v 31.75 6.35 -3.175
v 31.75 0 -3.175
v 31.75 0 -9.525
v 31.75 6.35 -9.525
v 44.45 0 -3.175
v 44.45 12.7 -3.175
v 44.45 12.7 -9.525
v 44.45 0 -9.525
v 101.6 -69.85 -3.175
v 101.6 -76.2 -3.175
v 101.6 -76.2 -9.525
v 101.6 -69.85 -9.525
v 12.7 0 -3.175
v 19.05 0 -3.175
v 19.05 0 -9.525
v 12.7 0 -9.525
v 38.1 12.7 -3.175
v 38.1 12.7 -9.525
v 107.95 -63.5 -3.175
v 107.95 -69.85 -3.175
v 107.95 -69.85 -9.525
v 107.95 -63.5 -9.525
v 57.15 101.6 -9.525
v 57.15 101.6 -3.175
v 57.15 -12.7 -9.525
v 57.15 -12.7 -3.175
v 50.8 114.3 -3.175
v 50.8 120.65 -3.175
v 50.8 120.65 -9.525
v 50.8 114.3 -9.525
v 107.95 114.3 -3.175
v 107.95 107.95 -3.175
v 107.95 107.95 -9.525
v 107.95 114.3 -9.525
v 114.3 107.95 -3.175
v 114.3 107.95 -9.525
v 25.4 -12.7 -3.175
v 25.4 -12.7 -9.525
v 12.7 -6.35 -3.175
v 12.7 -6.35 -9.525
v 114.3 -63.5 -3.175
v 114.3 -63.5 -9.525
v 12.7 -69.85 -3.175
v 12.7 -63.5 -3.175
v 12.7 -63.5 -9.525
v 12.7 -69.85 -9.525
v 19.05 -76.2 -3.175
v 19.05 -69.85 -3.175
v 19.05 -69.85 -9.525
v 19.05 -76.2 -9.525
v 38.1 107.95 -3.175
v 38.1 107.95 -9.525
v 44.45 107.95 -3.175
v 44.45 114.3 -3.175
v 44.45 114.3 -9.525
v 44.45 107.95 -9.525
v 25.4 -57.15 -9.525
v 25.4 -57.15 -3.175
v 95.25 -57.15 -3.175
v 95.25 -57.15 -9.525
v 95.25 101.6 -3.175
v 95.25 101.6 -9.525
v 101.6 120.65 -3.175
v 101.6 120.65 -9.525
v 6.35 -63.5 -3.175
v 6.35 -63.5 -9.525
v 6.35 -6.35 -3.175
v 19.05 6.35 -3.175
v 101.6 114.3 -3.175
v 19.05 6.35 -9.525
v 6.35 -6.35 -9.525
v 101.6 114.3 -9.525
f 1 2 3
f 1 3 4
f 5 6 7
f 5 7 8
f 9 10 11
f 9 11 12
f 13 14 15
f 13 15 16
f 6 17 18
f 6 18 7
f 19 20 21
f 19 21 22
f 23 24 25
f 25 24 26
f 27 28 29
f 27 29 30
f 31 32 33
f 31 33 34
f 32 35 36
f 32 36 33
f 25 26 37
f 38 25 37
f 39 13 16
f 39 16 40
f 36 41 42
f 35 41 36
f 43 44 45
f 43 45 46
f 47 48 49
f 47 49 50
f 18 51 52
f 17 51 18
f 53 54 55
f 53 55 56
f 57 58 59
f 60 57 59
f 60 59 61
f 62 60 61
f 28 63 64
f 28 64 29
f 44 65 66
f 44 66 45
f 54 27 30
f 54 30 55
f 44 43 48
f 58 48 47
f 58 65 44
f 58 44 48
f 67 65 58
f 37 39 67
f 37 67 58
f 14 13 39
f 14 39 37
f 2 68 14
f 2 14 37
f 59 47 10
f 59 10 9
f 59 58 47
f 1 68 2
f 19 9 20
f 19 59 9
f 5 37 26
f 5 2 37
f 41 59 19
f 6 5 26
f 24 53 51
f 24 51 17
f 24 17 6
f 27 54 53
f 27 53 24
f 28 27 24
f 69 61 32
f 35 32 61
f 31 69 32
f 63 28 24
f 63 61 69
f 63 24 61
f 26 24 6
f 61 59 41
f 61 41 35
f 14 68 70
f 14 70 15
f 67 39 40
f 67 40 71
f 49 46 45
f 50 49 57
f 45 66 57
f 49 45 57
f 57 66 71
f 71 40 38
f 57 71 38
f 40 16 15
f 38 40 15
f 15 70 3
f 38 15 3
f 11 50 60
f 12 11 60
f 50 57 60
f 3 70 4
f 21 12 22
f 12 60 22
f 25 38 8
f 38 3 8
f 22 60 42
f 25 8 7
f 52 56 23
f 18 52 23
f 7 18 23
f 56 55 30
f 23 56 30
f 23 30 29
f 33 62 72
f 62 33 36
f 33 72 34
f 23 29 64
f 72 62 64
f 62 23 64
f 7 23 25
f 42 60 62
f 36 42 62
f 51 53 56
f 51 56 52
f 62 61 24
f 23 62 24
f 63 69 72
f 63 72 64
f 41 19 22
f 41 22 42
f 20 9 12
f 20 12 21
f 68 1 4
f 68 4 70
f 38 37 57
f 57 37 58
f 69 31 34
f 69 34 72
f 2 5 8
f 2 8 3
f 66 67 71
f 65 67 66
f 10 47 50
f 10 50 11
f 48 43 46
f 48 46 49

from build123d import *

# Parameters (mm, degrees)
BOSS_EXTRUDE1_START = -3.175
BOSS_EXTRUDE1_DEPTH = 6.35
CUT_EXTRUDE1_DEPTH  = 167.316670842


with BuildPart() as part:
    # Sketch1 → Boss-Extrude1 (new body)
    with BuildSketch(Plane.XY.offset(BOSS_EXTRUDE1_START)):
        Polygon((12.7, -69.85), (19.05, -69.85), (19.05, -76.2), (101.6, -76.2), (101.6, -69.85), (107.95, -69.85), (107.95, -63.5), (114.3, -63.5), (114.3, 107.95), (107.95, 107.95), (107.95, 114.3), (101.6, 114.3), (101.6, 120.65), (50.8, 120.65), (50.8, 114.3), (44.45, 114.3), (44.45, 107.95), (38.1, 107.95), (38.1, 12.7), (44.45, 12.7), (44.45, 0), (31.75, 0), (31.75, 6.35), (19.05, 6.35), (19.05, 0), (12.7, 0), (12.7, -6.35), (6.35, -6.35), (6.35, -63.5), (12.7, -63.5), align=None)
    extrude(amount=-BOSS_EXTRUDE1_DEPTH)

    # Sketch2 → Cut-Extrude1 (cut, through all)
    with BuildSketch(Plane.XY.offset(-3.175)):
        Polygon((25.4, -57.15), (95.25, -57.15), (95.25, 101.6), (57.15, 101.6), (57.15, -12.7), (25.4, -12.7), align=None)
    extrude(amount=-CUT_EXTRUDE1_DEPTH, mode=Mode.SUBTRACT)


solid = part.part
